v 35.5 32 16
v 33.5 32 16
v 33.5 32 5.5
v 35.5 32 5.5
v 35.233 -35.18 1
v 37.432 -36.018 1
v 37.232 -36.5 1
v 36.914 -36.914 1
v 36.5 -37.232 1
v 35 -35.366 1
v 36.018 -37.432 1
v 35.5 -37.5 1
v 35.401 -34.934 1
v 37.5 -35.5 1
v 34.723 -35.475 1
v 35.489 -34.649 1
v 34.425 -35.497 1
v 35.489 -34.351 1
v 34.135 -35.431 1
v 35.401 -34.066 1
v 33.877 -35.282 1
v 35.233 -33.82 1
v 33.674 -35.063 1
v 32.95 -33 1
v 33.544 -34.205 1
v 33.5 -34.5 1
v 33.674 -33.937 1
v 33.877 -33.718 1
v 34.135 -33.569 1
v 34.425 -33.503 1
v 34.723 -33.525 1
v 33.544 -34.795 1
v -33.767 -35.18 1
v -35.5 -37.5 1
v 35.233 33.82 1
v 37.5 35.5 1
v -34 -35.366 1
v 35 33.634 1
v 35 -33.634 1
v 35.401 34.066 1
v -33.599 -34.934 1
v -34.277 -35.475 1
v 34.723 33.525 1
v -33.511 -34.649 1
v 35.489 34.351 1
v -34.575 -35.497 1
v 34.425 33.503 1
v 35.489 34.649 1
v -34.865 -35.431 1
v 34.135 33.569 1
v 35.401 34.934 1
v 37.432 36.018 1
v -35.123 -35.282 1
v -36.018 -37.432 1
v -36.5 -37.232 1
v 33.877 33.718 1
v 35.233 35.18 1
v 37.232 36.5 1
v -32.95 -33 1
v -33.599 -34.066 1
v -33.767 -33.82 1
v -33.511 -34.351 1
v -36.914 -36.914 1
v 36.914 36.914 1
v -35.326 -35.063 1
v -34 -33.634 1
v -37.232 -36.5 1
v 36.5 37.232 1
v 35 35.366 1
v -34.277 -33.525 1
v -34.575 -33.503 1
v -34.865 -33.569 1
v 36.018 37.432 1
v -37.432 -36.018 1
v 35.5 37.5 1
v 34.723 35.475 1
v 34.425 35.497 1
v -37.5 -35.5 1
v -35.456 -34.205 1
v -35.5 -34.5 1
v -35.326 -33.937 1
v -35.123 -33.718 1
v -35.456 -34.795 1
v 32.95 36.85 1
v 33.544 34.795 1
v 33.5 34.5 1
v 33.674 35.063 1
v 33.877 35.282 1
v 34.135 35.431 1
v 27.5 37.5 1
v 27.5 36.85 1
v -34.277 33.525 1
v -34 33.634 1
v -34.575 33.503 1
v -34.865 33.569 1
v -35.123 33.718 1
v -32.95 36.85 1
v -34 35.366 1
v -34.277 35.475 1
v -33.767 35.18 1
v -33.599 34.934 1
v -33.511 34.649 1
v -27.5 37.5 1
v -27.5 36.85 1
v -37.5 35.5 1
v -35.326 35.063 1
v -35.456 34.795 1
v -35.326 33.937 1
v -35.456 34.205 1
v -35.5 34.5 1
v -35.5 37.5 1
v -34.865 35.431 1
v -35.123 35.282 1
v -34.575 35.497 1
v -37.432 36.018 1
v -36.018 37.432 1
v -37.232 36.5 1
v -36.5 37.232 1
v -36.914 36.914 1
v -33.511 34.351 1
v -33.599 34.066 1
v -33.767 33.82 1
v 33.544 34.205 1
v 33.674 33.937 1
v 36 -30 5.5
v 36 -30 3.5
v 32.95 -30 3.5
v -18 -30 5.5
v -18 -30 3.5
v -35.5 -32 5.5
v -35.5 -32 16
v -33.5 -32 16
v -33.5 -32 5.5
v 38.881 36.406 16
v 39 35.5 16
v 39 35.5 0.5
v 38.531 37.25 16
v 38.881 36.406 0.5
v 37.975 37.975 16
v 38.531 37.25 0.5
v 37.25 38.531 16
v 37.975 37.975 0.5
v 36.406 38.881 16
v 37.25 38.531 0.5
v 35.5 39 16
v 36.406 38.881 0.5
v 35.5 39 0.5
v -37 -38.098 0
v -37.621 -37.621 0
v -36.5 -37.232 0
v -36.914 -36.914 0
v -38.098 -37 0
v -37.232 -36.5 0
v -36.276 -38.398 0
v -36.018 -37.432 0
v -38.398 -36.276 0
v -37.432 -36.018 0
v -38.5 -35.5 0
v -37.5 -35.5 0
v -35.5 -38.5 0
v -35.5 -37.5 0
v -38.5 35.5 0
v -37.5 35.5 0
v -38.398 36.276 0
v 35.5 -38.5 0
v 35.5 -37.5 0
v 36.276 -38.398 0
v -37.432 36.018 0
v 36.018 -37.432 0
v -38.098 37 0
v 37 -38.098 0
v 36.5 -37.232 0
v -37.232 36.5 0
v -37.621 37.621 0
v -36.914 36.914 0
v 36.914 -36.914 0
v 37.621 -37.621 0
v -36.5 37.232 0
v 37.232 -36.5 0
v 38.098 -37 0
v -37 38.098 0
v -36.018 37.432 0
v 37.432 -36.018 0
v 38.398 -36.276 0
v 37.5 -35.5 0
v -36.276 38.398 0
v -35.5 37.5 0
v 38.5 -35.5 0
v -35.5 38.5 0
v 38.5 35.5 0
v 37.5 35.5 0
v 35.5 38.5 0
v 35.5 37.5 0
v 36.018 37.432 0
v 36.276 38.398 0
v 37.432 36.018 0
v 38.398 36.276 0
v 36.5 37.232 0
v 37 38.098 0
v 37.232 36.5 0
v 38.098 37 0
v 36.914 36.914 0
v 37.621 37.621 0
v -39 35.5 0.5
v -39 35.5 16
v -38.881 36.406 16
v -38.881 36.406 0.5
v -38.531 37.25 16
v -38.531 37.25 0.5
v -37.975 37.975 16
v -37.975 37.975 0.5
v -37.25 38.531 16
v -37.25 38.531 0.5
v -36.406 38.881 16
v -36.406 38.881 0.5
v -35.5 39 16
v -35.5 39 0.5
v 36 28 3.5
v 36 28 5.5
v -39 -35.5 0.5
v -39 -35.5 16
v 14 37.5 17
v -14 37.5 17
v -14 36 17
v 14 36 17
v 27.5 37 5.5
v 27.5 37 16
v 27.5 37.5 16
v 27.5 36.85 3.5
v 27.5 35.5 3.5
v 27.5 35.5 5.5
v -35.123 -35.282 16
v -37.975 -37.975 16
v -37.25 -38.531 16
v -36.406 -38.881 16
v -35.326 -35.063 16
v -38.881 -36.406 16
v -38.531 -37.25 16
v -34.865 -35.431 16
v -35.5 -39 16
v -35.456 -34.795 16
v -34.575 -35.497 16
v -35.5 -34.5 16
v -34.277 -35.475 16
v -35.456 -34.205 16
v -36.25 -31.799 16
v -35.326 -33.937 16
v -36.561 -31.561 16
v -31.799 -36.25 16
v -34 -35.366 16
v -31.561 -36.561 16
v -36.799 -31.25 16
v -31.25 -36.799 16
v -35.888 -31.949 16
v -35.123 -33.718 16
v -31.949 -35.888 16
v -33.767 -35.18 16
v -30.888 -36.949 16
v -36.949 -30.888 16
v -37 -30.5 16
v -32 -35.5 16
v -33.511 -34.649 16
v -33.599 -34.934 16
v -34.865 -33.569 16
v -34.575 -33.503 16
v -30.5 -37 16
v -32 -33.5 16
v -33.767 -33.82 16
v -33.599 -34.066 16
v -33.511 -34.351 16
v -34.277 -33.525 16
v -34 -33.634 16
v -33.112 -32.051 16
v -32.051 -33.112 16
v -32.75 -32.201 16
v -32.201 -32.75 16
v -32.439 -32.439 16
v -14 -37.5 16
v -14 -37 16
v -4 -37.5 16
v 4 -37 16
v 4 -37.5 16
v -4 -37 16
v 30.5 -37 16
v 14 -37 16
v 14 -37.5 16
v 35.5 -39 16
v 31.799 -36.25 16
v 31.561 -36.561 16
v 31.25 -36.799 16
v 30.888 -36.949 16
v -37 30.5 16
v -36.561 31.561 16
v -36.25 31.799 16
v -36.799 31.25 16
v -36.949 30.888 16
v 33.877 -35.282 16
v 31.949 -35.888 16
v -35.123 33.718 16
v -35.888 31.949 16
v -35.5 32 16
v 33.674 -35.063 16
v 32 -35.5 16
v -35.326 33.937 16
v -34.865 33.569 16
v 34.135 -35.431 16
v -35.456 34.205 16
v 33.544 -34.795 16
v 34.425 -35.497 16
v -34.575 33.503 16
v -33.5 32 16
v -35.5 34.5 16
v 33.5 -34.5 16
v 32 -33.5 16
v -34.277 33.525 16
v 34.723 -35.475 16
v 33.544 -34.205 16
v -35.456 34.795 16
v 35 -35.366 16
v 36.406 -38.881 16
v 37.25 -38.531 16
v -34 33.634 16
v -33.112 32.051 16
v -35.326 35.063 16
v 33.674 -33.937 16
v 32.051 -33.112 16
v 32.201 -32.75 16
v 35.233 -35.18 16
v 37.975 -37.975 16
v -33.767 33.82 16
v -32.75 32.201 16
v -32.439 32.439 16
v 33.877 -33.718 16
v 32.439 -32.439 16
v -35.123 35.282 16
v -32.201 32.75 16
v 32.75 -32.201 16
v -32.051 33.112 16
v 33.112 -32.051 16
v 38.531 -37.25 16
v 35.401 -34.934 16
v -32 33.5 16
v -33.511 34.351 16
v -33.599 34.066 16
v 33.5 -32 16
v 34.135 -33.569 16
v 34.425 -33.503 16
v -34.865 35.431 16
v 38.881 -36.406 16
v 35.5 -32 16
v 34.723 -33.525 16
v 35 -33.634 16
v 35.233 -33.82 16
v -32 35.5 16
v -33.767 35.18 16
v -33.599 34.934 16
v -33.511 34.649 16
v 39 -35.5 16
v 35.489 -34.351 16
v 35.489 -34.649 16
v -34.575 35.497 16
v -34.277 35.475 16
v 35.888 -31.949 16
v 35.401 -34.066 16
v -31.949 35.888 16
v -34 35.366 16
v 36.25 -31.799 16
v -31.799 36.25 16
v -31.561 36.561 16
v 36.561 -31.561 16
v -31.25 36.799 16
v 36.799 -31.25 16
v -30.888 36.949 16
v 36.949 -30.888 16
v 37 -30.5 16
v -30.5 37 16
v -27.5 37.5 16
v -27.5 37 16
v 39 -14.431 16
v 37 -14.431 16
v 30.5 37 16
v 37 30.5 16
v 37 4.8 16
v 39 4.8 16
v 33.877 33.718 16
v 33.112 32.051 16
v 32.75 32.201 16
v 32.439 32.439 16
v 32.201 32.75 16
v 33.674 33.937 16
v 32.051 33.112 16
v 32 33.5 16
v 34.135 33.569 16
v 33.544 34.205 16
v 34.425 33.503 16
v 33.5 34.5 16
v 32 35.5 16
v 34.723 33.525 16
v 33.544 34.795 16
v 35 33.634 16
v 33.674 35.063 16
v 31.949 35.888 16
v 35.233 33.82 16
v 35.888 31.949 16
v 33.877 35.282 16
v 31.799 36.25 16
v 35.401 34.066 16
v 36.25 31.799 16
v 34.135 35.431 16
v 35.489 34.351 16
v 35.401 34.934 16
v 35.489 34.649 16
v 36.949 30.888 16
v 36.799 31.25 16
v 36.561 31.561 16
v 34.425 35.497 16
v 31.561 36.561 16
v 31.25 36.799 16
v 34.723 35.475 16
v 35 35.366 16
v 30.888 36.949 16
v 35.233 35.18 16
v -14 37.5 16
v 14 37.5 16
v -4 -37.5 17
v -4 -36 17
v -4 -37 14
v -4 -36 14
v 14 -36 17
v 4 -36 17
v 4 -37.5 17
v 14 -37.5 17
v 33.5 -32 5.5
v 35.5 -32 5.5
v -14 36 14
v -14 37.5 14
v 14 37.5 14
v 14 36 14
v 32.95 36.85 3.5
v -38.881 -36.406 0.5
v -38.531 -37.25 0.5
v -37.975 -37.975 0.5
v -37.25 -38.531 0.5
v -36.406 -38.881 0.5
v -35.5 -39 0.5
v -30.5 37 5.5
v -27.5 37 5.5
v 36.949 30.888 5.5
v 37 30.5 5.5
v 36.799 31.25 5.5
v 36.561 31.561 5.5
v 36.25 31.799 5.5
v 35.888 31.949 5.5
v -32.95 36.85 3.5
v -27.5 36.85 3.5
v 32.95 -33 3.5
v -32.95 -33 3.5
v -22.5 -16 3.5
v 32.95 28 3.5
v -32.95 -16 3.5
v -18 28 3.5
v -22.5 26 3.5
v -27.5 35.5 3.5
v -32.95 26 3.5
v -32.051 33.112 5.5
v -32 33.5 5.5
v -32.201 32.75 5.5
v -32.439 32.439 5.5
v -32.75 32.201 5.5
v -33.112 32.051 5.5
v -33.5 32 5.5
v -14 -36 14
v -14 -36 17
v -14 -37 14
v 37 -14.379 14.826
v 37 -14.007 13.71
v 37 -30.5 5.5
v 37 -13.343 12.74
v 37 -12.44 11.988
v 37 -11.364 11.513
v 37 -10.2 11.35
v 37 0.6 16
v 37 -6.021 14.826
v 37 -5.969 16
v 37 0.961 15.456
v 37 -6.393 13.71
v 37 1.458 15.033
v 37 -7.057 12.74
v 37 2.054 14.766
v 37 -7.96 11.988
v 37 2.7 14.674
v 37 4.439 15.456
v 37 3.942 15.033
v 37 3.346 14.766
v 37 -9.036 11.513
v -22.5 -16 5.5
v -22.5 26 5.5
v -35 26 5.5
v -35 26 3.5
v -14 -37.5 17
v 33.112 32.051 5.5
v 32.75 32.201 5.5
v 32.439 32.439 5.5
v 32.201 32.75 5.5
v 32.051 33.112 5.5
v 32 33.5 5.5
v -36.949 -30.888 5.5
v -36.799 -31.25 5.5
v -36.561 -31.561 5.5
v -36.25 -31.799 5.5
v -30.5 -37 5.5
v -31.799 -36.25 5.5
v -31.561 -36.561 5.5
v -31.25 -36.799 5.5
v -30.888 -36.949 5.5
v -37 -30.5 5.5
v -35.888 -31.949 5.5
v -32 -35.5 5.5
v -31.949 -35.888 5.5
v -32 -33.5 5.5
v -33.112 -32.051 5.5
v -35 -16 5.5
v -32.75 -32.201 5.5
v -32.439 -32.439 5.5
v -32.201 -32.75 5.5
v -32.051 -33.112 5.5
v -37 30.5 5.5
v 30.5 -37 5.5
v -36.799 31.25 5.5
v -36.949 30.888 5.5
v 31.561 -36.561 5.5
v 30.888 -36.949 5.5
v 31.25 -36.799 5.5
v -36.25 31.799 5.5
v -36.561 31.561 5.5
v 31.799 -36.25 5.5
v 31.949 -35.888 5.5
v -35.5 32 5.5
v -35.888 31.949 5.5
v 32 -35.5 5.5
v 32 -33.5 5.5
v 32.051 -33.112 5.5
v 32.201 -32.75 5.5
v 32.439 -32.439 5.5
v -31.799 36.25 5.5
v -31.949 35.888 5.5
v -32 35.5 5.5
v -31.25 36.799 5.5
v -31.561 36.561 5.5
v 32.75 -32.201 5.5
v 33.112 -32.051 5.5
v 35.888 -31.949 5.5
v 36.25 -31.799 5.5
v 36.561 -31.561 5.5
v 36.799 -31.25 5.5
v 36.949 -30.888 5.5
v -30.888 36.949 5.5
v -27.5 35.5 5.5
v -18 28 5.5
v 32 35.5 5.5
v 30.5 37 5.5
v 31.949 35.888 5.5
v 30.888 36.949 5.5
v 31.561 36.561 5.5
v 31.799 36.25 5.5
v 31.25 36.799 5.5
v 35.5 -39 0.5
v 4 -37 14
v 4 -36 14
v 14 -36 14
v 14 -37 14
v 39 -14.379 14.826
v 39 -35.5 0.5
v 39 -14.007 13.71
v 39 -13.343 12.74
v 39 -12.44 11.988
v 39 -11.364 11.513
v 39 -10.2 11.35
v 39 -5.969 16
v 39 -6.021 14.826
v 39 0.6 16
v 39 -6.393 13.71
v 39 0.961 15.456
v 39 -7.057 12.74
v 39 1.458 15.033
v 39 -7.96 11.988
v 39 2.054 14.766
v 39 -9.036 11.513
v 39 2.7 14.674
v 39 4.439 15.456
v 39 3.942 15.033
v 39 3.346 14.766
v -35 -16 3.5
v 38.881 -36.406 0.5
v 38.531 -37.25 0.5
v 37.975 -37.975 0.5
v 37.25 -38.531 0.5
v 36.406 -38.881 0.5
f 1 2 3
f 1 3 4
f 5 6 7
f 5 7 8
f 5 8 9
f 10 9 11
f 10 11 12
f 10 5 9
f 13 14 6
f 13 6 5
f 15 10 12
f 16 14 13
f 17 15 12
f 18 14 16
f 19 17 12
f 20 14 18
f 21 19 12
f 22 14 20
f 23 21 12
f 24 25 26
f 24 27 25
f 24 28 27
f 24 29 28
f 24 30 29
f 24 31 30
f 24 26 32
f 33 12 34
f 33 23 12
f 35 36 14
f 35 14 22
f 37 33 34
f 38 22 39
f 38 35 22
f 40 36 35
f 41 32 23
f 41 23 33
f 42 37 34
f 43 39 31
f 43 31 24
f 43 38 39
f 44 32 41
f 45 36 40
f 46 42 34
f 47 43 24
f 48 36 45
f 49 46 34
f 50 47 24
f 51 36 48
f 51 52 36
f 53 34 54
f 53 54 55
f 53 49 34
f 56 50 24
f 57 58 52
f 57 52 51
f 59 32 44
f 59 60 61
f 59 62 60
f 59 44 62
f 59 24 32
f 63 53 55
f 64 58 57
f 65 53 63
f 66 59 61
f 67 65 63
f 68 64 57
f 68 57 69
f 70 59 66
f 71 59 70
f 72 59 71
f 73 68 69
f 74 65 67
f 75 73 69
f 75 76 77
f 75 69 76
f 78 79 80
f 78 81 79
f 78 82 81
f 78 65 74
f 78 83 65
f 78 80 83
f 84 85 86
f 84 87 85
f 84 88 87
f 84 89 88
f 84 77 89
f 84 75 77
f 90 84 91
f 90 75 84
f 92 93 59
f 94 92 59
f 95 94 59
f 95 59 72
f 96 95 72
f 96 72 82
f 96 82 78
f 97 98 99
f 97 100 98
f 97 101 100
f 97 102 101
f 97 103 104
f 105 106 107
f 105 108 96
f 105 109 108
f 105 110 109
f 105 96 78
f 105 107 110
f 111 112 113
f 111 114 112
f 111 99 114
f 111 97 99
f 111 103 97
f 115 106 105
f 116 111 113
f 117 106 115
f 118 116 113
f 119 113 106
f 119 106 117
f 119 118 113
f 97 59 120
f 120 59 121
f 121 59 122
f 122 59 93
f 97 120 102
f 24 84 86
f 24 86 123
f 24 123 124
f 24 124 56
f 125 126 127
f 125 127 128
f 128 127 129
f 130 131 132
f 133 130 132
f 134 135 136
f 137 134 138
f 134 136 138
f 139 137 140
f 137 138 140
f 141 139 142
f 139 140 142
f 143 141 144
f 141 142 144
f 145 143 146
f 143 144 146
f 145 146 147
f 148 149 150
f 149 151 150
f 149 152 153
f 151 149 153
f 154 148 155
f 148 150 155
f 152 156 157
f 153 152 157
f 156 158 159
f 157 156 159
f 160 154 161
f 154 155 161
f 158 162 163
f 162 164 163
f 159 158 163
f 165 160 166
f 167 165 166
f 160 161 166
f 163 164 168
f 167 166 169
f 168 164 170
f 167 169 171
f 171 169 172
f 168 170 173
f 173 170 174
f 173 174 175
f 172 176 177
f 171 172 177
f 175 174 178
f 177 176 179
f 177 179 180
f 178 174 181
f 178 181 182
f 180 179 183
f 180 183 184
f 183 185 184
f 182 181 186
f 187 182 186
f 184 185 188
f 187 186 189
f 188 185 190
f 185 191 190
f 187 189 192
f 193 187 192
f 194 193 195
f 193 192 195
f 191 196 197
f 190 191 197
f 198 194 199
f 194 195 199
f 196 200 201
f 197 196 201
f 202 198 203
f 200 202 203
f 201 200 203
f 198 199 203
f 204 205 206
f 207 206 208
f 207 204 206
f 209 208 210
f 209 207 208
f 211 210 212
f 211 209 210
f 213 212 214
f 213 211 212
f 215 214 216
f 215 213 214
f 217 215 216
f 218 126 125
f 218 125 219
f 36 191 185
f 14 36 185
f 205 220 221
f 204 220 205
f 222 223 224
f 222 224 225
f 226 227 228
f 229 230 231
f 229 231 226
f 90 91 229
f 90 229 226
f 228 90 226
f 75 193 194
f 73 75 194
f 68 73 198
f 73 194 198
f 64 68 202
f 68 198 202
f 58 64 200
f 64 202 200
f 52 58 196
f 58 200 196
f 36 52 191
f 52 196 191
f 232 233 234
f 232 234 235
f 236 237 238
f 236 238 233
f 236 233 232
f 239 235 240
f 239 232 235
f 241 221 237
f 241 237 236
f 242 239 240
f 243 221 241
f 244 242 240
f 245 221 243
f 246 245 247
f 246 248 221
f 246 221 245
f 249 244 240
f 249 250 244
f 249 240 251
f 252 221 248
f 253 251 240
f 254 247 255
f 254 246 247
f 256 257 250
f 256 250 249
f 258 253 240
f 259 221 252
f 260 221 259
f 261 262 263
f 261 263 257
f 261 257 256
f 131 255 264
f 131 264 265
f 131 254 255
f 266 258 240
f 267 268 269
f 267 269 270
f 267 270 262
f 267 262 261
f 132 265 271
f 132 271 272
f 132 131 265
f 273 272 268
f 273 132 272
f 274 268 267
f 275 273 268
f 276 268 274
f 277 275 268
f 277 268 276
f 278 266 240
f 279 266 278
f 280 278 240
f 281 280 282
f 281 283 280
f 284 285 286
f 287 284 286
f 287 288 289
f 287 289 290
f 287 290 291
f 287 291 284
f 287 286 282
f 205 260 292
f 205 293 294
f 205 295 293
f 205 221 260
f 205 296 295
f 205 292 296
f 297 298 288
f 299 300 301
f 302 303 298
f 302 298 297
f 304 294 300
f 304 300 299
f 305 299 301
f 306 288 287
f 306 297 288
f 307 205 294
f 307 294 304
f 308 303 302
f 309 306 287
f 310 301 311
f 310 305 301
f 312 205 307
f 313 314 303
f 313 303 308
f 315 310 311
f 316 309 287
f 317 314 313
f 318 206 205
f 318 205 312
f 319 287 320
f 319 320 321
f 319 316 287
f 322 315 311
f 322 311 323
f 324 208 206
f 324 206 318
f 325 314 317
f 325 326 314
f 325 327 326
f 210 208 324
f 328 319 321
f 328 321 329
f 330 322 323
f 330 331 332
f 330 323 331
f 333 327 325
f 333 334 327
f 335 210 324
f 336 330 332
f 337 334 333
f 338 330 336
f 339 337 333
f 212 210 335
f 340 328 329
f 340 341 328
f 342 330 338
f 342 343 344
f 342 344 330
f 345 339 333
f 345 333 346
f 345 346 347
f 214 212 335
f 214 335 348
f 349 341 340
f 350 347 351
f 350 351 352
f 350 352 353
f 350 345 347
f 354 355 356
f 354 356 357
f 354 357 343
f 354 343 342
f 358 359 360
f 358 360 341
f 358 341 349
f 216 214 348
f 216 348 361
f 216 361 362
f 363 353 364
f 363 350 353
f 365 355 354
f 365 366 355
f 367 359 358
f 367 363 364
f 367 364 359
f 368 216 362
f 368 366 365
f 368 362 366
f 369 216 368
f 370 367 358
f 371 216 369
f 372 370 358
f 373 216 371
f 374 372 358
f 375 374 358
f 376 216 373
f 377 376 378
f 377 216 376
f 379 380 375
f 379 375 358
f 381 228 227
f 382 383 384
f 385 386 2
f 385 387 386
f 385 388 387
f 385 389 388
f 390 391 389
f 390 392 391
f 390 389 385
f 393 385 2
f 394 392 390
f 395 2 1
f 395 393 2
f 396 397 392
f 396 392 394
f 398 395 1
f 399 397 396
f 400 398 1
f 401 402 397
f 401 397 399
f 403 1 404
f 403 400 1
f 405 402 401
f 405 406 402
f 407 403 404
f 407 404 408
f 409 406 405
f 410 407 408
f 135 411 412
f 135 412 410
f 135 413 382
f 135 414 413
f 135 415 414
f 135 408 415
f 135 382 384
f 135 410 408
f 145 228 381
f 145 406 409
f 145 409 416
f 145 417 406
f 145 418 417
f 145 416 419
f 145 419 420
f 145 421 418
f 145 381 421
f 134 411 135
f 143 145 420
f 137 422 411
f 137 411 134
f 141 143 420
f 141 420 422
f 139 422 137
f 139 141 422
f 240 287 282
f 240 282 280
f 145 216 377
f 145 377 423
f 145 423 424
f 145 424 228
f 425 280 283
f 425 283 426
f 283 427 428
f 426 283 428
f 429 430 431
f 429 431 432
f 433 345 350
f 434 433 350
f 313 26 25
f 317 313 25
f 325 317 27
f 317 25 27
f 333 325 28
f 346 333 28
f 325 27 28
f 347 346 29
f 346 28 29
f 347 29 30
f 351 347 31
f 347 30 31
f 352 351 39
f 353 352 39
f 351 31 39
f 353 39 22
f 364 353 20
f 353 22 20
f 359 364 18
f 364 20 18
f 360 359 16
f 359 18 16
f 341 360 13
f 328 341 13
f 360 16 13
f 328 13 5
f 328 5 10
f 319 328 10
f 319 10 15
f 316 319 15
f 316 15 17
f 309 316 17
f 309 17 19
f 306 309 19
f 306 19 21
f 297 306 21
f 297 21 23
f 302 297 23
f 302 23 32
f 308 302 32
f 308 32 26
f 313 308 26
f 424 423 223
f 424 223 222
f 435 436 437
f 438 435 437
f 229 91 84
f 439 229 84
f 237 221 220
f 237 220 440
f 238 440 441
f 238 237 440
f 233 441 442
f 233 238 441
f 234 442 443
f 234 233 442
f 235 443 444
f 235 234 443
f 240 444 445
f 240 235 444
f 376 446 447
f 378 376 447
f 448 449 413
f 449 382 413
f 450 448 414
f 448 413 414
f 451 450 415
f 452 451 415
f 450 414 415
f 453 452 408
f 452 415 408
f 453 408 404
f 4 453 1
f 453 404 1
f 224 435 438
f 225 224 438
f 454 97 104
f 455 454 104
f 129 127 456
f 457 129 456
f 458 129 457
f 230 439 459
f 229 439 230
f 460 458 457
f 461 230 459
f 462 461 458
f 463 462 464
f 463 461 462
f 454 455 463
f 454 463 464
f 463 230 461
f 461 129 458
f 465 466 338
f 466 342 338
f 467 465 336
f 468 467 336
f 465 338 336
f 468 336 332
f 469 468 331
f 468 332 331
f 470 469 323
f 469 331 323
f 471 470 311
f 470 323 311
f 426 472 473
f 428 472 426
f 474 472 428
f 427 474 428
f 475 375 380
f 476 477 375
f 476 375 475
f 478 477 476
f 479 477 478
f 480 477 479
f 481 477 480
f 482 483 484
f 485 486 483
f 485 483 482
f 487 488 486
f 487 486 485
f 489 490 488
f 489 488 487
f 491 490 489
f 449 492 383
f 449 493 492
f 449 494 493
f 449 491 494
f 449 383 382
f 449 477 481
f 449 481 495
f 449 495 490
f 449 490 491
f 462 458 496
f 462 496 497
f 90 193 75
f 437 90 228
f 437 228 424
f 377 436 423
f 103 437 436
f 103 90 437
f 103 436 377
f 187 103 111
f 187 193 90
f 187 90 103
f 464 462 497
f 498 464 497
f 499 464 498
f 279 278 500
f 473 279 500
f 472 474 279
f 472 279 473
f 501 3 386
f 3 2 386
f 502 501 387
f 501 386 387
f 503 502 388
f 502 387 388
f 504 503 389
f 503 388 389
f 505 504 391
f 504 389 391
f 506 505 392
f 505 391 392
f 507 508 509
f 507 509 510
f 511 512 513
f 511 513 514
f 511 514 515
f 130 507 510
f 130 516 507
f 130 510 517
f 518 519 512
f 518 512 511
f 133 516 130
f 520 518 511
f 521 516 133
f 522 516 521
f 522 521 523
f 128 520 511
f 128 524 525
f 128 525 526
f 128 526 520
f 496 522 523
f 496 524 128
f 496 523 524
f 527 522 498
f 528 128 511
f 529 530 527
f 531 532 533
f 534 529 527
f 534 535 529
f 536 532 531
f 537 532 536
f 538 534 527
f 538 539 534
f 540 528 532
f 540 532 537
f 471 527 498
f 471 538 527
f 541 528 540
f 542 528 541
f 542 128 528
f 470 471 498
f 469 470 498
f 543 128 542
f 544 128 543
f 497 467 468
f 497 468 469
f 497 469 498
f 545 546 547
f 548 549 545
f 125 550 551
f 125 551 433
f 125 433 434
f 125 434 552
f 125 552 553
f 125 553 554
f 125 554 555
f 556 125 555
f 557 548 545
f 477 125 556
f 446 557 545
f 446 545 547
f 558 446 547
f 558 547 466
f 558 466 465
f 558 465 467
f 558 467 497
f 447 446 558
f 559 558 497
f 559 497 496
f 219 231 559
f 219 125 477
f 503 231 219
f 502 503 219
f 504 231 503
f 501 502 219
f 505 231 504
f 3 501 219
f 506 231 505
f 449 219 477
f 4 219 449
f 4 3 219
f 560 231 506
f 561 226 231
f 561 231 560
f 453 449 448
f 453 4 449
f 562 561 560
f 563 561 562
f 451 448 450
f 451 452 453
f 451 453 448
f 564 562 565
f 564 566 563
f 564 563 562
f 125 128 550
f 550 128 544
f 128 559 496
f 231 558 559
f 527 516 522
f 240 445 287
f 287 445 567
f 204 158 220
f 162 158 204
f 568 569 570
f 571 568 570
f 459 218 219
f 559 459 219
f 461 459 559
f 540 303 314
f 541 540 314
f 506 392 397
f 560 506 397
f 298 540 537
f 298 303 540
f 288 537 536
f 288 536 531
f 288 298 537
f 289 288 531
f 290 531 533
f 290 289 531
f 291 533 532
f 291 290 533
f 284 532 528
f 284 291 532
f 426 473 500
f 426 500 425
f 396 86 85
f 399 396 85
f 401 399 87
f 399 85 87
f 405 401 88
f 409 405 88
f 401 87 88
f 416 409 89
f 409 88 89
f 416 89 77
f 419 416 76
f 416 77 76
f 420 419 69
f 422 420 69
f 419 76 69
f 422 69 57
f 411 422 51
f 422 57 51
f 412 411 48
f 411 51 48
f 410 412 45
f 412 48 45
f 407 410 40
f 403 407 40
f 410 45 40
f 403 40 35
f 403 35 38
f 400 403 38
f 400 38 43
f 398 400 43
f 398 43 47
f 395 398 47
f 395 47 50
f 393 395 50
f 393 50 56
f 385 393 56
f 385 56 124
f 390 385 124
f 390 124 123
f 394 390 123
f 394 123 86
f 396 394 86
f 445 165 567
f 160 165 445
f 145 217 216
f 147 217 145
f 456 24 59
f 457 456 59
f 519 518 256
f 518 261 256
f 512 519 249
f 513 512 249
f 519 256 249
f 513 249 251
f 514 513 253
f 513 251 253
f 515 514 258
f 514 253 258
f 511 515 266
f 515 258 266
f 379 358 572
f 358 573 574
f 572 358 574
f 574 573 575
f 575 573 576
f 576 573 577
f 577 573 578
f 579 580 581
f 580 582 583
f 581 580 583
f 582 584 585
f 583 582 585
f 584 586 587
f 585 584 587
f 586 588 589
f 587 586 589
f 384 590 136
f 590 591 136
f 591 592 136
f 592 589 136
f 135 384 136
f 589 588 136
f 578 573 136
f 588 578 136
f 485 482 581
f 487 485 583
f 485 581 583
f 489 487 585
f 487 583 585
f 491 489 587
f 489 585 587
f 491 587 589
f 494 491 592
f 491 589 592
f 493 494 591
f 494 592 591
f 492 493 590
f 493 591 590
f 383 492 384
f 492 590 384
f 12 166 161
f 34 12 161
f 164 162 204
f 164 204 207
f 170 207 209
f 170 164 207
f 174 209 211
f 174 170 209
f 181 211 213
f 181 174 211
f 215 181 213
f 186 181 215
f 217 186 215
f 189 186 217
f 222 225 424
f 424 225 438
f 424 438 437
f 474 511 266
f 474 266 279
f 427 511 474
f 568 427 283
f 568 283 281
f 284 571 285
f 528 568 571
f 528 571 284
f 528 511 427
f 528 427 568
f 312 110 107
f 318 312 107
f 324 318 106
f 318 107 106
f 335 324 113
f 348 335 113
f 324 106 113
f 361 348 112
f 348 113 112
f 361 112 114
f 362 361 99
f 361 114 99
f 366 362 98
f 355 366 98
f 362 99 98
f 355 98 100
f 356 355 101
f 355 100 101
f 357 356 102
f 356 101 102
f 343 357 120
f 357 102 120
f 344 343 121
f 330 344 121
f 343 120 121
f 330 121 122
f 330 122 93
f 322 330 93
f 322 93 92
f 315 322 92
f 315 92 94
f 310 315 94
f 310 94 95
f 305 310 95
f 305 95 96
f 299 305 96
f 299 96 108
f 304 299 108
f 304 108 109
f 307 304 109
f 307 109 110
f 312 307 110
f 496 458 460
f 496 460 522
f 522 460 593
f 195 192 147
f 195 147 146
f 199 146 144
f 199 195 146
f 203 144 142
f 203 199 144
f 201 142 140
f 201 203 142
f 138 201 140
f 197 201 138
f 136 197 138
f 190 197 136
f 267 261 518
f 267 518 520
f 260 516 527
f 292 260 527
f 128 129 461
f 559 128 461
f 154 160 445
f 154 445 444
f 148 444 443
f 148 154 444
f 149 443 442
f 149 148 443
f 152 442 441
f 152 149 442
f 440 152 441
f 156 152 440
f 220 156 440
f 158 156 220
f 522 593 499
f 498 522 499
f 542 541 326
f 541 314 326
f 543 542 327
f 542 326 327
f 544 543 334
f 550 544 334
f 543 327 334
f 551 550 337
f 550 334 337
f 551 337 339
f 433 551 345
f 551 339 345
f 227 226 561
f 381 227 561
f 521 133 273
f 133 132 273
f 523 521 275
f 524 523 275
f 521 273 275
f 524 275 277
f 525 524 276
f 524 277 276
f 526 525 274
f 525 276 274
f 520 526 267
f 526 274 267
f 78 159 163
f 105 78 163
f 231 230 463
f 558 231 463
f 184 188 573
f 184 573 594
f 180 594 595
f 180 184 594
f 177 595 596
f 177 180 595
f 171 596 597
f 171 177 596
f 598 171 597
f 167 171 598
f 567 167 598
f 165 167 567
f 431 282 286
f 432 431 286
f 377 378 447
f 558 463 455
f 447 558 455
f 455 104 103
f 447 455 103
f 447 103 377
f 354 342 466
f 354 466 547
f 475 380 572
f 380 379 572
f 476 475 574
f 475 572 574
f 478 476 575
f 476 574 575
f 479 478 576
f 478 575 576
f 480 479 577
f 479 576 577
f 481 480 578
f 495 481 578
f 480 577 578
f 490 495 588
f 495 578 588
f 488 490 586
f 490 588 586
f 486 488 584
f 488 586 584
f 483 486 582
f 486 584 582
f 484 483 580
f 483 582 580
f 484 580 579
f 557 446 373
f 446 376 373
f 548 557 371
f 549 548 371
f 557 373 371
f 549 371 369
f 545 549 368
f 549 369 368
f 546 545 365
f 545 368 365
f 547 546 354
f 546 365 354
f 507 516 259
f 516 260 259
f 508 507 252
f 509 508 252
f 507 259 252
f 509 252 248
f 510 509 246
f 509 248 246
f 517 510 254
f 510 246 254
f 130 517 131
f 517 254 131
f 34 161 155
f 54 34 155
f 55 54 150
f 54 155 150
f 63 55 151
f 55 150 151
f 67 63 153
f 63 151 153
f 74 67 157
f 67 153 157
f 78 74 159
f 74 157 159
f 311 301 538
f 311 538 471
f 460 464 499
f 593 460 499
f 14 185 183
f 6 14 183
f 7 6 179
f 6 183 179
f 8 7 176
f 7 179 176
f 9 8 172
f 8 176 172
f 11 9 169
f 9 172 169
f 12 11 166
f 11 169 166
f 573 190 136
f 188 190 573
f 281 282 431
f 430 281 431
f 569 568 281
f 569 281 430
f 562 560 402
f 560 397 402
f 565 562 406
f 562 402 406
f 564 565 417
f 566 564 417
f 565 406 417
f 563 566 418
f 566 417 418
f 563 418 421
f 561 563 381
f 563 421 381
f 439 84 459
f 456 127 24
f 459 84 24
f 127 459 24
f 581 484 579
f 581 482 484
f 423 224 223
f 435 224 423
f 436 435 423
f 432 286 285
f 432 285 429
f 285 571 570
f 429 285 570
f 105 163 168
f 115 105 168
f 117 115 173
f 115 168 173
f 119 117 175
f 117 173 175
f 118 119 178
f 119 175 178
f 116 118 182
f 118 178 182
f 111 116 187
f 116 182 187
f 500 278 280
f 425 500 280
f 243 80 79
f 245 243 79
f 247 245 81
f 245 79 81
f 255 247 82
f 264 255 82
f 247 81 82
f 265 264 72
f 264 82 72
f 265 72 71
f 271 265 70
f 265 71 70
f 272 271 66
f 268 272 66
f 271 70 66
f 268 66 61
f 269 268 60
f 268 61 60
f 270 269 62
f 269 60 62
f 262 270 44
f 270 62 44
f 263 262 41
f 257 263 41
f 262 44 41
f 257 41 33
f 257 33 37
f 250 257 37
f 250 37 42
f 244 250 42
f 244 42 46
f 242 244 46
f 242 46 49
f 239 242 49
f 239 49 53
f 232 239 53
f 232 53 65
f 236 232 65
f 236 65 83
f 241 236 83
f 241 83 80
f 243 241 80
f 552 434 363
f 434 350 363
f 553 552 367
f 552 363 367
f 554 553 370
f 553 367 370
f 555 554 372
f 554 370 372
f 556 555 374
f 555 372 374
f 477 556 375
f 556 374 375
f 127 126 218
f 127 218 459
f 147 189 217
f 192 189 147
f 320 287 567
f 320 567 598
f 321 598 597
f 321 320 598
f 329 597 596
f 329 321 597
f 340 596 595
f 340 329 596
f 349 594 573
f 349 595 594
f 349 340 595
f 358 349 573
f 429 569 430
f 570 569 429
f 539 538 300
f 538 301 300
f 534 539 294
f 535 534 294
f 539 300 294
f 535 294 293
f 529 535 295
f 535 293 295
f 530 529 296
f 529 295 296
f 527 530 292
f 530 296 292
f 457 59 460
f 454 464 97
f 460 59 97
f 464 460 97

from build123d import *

# Parameters (mm, degrees)
SKETCH_1_W           = 78
SKETCH_1_H           = 78
EXTRUDE_1_DEPTH      = 5.5
SKETCH_2_W           = 78
SKETCH_2_H           = 78
SKETCH_2_W_2         = 74
SKETCH_2_H_2         = 74
SKETCH_2_W_3         = 5
SKETCH_2_H_3         = 5
EXTRUDE_2_DEPTH      = 10.5
FILLET_1_R           = 1.5
FILLET_2_R           = 3.5
CUT_EXTRUDE_1_DEPTH  = 1
CUT_EXTRUDE_2_DEPTH  = 2.5
SKETCH_5_R           = 1
CUT_EXTRUDE_3_DEPTH  = 58.15767665
CHAMFER_1_SIZE       = 0.5
SKETCH_6_W           = 55
SKETCH_6_H           = 2
SKETCH_6_W_2         = 54
SKETCH_6_H_2         = 58
SKETCH_6_W_3         = 12.5
SKETCH_6_H_3         = 42
CUT_EXTRUDE_4_DEPTH  = 57.553072419
EXTRUDE_3_DEPTH      = 1
EXTRUDE_3_DEPTH_BACK = 2
SKETCH_7_W           = 10
SKETCH_7_H           = 1.5
SKETCH_7_W_2         = 28
SKETCH_8_R           = 4.25
SKETCH_8_R_2         = 2.32594067
CUT_EXTRUDE_5_DEPTH  = 10


with BuildPart() as part:
    # 草图1 → 凸台-拉伸1 (new body)
    with BuildSketch(Plane.XY):
        Rectangle(SKETCH_1_W, SKETCH_1_H)
    extrude(amount=EXTRUDE_1_DEPTH)

    # 草图2 → 凸台-拉伸2 (add)
    # profile 1 of 5: a face of its own
    with BuildSketch(Plane.XY.offset(5.5)):
        Rectangle(SKETCH_2_W, SKETCH_2_H)
        Rectangle(SKETCH_2_W_2, SKETCH_2_H_2, mode=Mode.SUBTRACT)
    # profile 2 of 5: a face of its own
    with BuildSketch(Plane.XY.offset(5.5)):
        with Locations((-34.5, 34.5)):
            Rectangle(SKETCH_2_W_3, SKETCH_2_H_3)
    # profile 3 of 5: a face of its own
    with BuildSketch(Plane.XY.offset(5.5)):
        with Locations((34.5, 34.5)):
            Rectangle(SKETCH_2_W_3, SKETCH_2_H_3)
    # profile 4 of 5: a face of its own
    with BuildSketch(Plane.XY.offset(5.5)):
        with Locations((34.5, -34.5)):
            Rectangle(SKETCH_2_W_3, SKETCH_2_H_3)
    # profile 5 of 5: a face of its own
    with BuildSketch(Plane.XY.offset(5.5)):
        with Locations((-34.5, -34.5)):
            Rectangle(SKETCH_2_W_3, SKETCH_2_H_3)
    extrude(amount=EXTRUDE_2_DEPTH)

    # 圆角1
    fillet_1_edges = [part.edges().sort_by_distance(p)[0] for p in [
        (-37, -32, 10.75),
        (-37, 32, 10.75),
        (-32, 32, 10.75),
        (-32, 37, 10.75),
        (32, 37, 10.75),
        (32, 32, 10.75),
        (37, 32, 10.75),
        (37, -32, 10.75),
        (32, -32, 10.75),
        (32, -37, 10.75),
        (-32, -37, 10.75),
        (-32, -32, 10.75),
    ]]
    fillet(fillet_1_edges, radius=FILLET_1_R)

    # 圆角2
    fillet_2_edges = [part.edges().sort_by_distance(p)[0] for p in [
        (39, -39, 8),
        (-39, -39, 8),
        (-39, 39, 8),
        (39, 39, 8),
    ]]
    fillet(fillet_2_edges, radius=FILLET_2_R)

    # 草图3 → 切除-拉伸1 (cut)
    with BuildSketch(Plane(origin=(0, 0, 0), x_dir=(-1, 0, 0), z_dir=(0, 0, -1))):
        with BuildLine():
            Line((37.5, -35.5), (37.5, 35.5))
            ThreePointArc((37.5, 35.5), (36.914213562, 36.914213562), (35.5, 37.5))
            Line((35.5, 37.5), (-35.5, 37.5))
            ThreePointArc((-35.5, 37.5), (-36.914213562, 36.914213562), (-37.5, 35.5))
            Line((-37.5, 35.5), (-37.5, -35.5))
            ThreePointArc((-37.5, -35.5), (-36.914213562, -36.914213562), (-35.5, -37.5))
            Line((-35.5, -37.5), (35.5, -37.5))
            ThreePointArc((35.5, -37.5), (36.914213562, -36.914213562), (37.5, -35.5))
        make_face()
    extrude(amount=-CUT_EXTRUDE_1_DEPTH, mode=Mode.SUBTRACT)

    # 草图4 → 切除-拉伸2 (cut)
    with BuildSketch(Plane(origin=(0, 0, 1), x_dir=(-1, 0, 0), z_dir=(0, 0, -1))):
        Polygon((27.5, 37.5), (-27.5, 37.5), (-27.5, 36.85), (-32.95, 36.85), (-32.95, -33), (32.95, -33), (32.95, 36.85), (27.5, 36.85), align=None)
    extrude(amount=-CUT_EXTRUDE_2_DEPTH, mode=Mode.SUBTRACT)

    # 草图5 → 切除-拉伸3 (cut, through all)
    with BuildSketch(Plane(origin=(0, 0, 1), x_dir=(-1, 0, 0), z_dir=(0, 0, -1))):
        with Locations((-34.5, 34.5)):
            Circle(SKETCH_5_R)
        with Locations((34.5, 34.5)):
            Circle(SKETCH_5_R)
        with Locations((34.5, -34.5)):
            Circle(SKETCH_5_R)
        with Locations((-34.5, -34.5)):
            Circle(SKETCH_5_R)
    extrude(amount=-CUT_EXTRUDE_3_DEPTH, mode=Mode.SUBTRACT)

    # 倒角1
    chamfer_1_edges = [part.edges().sort_by_distance(p)[0] for p in [
        (-39, 0, 0),
        (39, 0, 0),
        (0, -39, 0),
        (0, 39, 0),
        (-37.974873734, -37.974873734, 0),
        (37.974873734, -37.974873734, 0),
        (37.974873734, 37.974873734, 0),
        (-37.974873734, 37.974873734, 0),
    ]]
    chamfer(chamfer_1_edges, length=CHAMFER_1_SIZE)

    # 草图6 → 切除-拉伸4 (cut, through all)
    with BuildSketch(Plane(origin=(0, 0, 3.5), x_dir=(-1, 0, 0), z_dir=(0, 0, -1))):
        with Locations((0, 36.5)):
            Rectangle(SKETCH_6_W, SKETCH_6_H)
        with Locations((-9, -1)):
            Rectangle(SKETCH_6_W_2, SKETCH_6_H_2)
        with Locations((28.75, 5)):
            Rectangle(SKETCH_6_W_3, SKETCH_6_H_3)
    extrude(amount=-CUT_EXTRUDE_4_DEPTH, mode=Mode.SUBTRACT)

    # 草图7 → 凸台-拉伸3 (add, two sides: drawn at the far end of the back side and taken through both)
    with BuildSketch(Plane.XY.offset(16).offset(-EXTRUDE_3_DEPTH_BACK)):
        with Locations((9, -36.75)):
            Rectangle(SKETCH_7_W, SKETCH_7_H)
        with Locations((-9, -36.75)):
            Rectangle(SKETCH_7_W, SKETCH_7_H)
        with Locations((0, 36.75)):
            Rectangle(SKETCH_7_W_2, SKETCH_7_H)
    extrude(amount=EXTRUDE_3_DEPTH + EXTRUDE_3_DEPTH_BACK)

    # 草图8 → 切除-拉伸5 (cut)
    with BuildSketch(Plane(origin=(39, 0, 0), x_dir=(0, 0, -1), z_dir=(1, 0, 0))):
        with Locations((-15.6, -10.2)):
            Circle(SKETCH_8_R)
        with Locations((-17, 2.7)):
            Circle(SKETCH_8_R_2)
    extrude(amount=-CUT_EXTRUDE_5_DEPTH, mode=Mode.SUBTRACT)


solid = part.part
